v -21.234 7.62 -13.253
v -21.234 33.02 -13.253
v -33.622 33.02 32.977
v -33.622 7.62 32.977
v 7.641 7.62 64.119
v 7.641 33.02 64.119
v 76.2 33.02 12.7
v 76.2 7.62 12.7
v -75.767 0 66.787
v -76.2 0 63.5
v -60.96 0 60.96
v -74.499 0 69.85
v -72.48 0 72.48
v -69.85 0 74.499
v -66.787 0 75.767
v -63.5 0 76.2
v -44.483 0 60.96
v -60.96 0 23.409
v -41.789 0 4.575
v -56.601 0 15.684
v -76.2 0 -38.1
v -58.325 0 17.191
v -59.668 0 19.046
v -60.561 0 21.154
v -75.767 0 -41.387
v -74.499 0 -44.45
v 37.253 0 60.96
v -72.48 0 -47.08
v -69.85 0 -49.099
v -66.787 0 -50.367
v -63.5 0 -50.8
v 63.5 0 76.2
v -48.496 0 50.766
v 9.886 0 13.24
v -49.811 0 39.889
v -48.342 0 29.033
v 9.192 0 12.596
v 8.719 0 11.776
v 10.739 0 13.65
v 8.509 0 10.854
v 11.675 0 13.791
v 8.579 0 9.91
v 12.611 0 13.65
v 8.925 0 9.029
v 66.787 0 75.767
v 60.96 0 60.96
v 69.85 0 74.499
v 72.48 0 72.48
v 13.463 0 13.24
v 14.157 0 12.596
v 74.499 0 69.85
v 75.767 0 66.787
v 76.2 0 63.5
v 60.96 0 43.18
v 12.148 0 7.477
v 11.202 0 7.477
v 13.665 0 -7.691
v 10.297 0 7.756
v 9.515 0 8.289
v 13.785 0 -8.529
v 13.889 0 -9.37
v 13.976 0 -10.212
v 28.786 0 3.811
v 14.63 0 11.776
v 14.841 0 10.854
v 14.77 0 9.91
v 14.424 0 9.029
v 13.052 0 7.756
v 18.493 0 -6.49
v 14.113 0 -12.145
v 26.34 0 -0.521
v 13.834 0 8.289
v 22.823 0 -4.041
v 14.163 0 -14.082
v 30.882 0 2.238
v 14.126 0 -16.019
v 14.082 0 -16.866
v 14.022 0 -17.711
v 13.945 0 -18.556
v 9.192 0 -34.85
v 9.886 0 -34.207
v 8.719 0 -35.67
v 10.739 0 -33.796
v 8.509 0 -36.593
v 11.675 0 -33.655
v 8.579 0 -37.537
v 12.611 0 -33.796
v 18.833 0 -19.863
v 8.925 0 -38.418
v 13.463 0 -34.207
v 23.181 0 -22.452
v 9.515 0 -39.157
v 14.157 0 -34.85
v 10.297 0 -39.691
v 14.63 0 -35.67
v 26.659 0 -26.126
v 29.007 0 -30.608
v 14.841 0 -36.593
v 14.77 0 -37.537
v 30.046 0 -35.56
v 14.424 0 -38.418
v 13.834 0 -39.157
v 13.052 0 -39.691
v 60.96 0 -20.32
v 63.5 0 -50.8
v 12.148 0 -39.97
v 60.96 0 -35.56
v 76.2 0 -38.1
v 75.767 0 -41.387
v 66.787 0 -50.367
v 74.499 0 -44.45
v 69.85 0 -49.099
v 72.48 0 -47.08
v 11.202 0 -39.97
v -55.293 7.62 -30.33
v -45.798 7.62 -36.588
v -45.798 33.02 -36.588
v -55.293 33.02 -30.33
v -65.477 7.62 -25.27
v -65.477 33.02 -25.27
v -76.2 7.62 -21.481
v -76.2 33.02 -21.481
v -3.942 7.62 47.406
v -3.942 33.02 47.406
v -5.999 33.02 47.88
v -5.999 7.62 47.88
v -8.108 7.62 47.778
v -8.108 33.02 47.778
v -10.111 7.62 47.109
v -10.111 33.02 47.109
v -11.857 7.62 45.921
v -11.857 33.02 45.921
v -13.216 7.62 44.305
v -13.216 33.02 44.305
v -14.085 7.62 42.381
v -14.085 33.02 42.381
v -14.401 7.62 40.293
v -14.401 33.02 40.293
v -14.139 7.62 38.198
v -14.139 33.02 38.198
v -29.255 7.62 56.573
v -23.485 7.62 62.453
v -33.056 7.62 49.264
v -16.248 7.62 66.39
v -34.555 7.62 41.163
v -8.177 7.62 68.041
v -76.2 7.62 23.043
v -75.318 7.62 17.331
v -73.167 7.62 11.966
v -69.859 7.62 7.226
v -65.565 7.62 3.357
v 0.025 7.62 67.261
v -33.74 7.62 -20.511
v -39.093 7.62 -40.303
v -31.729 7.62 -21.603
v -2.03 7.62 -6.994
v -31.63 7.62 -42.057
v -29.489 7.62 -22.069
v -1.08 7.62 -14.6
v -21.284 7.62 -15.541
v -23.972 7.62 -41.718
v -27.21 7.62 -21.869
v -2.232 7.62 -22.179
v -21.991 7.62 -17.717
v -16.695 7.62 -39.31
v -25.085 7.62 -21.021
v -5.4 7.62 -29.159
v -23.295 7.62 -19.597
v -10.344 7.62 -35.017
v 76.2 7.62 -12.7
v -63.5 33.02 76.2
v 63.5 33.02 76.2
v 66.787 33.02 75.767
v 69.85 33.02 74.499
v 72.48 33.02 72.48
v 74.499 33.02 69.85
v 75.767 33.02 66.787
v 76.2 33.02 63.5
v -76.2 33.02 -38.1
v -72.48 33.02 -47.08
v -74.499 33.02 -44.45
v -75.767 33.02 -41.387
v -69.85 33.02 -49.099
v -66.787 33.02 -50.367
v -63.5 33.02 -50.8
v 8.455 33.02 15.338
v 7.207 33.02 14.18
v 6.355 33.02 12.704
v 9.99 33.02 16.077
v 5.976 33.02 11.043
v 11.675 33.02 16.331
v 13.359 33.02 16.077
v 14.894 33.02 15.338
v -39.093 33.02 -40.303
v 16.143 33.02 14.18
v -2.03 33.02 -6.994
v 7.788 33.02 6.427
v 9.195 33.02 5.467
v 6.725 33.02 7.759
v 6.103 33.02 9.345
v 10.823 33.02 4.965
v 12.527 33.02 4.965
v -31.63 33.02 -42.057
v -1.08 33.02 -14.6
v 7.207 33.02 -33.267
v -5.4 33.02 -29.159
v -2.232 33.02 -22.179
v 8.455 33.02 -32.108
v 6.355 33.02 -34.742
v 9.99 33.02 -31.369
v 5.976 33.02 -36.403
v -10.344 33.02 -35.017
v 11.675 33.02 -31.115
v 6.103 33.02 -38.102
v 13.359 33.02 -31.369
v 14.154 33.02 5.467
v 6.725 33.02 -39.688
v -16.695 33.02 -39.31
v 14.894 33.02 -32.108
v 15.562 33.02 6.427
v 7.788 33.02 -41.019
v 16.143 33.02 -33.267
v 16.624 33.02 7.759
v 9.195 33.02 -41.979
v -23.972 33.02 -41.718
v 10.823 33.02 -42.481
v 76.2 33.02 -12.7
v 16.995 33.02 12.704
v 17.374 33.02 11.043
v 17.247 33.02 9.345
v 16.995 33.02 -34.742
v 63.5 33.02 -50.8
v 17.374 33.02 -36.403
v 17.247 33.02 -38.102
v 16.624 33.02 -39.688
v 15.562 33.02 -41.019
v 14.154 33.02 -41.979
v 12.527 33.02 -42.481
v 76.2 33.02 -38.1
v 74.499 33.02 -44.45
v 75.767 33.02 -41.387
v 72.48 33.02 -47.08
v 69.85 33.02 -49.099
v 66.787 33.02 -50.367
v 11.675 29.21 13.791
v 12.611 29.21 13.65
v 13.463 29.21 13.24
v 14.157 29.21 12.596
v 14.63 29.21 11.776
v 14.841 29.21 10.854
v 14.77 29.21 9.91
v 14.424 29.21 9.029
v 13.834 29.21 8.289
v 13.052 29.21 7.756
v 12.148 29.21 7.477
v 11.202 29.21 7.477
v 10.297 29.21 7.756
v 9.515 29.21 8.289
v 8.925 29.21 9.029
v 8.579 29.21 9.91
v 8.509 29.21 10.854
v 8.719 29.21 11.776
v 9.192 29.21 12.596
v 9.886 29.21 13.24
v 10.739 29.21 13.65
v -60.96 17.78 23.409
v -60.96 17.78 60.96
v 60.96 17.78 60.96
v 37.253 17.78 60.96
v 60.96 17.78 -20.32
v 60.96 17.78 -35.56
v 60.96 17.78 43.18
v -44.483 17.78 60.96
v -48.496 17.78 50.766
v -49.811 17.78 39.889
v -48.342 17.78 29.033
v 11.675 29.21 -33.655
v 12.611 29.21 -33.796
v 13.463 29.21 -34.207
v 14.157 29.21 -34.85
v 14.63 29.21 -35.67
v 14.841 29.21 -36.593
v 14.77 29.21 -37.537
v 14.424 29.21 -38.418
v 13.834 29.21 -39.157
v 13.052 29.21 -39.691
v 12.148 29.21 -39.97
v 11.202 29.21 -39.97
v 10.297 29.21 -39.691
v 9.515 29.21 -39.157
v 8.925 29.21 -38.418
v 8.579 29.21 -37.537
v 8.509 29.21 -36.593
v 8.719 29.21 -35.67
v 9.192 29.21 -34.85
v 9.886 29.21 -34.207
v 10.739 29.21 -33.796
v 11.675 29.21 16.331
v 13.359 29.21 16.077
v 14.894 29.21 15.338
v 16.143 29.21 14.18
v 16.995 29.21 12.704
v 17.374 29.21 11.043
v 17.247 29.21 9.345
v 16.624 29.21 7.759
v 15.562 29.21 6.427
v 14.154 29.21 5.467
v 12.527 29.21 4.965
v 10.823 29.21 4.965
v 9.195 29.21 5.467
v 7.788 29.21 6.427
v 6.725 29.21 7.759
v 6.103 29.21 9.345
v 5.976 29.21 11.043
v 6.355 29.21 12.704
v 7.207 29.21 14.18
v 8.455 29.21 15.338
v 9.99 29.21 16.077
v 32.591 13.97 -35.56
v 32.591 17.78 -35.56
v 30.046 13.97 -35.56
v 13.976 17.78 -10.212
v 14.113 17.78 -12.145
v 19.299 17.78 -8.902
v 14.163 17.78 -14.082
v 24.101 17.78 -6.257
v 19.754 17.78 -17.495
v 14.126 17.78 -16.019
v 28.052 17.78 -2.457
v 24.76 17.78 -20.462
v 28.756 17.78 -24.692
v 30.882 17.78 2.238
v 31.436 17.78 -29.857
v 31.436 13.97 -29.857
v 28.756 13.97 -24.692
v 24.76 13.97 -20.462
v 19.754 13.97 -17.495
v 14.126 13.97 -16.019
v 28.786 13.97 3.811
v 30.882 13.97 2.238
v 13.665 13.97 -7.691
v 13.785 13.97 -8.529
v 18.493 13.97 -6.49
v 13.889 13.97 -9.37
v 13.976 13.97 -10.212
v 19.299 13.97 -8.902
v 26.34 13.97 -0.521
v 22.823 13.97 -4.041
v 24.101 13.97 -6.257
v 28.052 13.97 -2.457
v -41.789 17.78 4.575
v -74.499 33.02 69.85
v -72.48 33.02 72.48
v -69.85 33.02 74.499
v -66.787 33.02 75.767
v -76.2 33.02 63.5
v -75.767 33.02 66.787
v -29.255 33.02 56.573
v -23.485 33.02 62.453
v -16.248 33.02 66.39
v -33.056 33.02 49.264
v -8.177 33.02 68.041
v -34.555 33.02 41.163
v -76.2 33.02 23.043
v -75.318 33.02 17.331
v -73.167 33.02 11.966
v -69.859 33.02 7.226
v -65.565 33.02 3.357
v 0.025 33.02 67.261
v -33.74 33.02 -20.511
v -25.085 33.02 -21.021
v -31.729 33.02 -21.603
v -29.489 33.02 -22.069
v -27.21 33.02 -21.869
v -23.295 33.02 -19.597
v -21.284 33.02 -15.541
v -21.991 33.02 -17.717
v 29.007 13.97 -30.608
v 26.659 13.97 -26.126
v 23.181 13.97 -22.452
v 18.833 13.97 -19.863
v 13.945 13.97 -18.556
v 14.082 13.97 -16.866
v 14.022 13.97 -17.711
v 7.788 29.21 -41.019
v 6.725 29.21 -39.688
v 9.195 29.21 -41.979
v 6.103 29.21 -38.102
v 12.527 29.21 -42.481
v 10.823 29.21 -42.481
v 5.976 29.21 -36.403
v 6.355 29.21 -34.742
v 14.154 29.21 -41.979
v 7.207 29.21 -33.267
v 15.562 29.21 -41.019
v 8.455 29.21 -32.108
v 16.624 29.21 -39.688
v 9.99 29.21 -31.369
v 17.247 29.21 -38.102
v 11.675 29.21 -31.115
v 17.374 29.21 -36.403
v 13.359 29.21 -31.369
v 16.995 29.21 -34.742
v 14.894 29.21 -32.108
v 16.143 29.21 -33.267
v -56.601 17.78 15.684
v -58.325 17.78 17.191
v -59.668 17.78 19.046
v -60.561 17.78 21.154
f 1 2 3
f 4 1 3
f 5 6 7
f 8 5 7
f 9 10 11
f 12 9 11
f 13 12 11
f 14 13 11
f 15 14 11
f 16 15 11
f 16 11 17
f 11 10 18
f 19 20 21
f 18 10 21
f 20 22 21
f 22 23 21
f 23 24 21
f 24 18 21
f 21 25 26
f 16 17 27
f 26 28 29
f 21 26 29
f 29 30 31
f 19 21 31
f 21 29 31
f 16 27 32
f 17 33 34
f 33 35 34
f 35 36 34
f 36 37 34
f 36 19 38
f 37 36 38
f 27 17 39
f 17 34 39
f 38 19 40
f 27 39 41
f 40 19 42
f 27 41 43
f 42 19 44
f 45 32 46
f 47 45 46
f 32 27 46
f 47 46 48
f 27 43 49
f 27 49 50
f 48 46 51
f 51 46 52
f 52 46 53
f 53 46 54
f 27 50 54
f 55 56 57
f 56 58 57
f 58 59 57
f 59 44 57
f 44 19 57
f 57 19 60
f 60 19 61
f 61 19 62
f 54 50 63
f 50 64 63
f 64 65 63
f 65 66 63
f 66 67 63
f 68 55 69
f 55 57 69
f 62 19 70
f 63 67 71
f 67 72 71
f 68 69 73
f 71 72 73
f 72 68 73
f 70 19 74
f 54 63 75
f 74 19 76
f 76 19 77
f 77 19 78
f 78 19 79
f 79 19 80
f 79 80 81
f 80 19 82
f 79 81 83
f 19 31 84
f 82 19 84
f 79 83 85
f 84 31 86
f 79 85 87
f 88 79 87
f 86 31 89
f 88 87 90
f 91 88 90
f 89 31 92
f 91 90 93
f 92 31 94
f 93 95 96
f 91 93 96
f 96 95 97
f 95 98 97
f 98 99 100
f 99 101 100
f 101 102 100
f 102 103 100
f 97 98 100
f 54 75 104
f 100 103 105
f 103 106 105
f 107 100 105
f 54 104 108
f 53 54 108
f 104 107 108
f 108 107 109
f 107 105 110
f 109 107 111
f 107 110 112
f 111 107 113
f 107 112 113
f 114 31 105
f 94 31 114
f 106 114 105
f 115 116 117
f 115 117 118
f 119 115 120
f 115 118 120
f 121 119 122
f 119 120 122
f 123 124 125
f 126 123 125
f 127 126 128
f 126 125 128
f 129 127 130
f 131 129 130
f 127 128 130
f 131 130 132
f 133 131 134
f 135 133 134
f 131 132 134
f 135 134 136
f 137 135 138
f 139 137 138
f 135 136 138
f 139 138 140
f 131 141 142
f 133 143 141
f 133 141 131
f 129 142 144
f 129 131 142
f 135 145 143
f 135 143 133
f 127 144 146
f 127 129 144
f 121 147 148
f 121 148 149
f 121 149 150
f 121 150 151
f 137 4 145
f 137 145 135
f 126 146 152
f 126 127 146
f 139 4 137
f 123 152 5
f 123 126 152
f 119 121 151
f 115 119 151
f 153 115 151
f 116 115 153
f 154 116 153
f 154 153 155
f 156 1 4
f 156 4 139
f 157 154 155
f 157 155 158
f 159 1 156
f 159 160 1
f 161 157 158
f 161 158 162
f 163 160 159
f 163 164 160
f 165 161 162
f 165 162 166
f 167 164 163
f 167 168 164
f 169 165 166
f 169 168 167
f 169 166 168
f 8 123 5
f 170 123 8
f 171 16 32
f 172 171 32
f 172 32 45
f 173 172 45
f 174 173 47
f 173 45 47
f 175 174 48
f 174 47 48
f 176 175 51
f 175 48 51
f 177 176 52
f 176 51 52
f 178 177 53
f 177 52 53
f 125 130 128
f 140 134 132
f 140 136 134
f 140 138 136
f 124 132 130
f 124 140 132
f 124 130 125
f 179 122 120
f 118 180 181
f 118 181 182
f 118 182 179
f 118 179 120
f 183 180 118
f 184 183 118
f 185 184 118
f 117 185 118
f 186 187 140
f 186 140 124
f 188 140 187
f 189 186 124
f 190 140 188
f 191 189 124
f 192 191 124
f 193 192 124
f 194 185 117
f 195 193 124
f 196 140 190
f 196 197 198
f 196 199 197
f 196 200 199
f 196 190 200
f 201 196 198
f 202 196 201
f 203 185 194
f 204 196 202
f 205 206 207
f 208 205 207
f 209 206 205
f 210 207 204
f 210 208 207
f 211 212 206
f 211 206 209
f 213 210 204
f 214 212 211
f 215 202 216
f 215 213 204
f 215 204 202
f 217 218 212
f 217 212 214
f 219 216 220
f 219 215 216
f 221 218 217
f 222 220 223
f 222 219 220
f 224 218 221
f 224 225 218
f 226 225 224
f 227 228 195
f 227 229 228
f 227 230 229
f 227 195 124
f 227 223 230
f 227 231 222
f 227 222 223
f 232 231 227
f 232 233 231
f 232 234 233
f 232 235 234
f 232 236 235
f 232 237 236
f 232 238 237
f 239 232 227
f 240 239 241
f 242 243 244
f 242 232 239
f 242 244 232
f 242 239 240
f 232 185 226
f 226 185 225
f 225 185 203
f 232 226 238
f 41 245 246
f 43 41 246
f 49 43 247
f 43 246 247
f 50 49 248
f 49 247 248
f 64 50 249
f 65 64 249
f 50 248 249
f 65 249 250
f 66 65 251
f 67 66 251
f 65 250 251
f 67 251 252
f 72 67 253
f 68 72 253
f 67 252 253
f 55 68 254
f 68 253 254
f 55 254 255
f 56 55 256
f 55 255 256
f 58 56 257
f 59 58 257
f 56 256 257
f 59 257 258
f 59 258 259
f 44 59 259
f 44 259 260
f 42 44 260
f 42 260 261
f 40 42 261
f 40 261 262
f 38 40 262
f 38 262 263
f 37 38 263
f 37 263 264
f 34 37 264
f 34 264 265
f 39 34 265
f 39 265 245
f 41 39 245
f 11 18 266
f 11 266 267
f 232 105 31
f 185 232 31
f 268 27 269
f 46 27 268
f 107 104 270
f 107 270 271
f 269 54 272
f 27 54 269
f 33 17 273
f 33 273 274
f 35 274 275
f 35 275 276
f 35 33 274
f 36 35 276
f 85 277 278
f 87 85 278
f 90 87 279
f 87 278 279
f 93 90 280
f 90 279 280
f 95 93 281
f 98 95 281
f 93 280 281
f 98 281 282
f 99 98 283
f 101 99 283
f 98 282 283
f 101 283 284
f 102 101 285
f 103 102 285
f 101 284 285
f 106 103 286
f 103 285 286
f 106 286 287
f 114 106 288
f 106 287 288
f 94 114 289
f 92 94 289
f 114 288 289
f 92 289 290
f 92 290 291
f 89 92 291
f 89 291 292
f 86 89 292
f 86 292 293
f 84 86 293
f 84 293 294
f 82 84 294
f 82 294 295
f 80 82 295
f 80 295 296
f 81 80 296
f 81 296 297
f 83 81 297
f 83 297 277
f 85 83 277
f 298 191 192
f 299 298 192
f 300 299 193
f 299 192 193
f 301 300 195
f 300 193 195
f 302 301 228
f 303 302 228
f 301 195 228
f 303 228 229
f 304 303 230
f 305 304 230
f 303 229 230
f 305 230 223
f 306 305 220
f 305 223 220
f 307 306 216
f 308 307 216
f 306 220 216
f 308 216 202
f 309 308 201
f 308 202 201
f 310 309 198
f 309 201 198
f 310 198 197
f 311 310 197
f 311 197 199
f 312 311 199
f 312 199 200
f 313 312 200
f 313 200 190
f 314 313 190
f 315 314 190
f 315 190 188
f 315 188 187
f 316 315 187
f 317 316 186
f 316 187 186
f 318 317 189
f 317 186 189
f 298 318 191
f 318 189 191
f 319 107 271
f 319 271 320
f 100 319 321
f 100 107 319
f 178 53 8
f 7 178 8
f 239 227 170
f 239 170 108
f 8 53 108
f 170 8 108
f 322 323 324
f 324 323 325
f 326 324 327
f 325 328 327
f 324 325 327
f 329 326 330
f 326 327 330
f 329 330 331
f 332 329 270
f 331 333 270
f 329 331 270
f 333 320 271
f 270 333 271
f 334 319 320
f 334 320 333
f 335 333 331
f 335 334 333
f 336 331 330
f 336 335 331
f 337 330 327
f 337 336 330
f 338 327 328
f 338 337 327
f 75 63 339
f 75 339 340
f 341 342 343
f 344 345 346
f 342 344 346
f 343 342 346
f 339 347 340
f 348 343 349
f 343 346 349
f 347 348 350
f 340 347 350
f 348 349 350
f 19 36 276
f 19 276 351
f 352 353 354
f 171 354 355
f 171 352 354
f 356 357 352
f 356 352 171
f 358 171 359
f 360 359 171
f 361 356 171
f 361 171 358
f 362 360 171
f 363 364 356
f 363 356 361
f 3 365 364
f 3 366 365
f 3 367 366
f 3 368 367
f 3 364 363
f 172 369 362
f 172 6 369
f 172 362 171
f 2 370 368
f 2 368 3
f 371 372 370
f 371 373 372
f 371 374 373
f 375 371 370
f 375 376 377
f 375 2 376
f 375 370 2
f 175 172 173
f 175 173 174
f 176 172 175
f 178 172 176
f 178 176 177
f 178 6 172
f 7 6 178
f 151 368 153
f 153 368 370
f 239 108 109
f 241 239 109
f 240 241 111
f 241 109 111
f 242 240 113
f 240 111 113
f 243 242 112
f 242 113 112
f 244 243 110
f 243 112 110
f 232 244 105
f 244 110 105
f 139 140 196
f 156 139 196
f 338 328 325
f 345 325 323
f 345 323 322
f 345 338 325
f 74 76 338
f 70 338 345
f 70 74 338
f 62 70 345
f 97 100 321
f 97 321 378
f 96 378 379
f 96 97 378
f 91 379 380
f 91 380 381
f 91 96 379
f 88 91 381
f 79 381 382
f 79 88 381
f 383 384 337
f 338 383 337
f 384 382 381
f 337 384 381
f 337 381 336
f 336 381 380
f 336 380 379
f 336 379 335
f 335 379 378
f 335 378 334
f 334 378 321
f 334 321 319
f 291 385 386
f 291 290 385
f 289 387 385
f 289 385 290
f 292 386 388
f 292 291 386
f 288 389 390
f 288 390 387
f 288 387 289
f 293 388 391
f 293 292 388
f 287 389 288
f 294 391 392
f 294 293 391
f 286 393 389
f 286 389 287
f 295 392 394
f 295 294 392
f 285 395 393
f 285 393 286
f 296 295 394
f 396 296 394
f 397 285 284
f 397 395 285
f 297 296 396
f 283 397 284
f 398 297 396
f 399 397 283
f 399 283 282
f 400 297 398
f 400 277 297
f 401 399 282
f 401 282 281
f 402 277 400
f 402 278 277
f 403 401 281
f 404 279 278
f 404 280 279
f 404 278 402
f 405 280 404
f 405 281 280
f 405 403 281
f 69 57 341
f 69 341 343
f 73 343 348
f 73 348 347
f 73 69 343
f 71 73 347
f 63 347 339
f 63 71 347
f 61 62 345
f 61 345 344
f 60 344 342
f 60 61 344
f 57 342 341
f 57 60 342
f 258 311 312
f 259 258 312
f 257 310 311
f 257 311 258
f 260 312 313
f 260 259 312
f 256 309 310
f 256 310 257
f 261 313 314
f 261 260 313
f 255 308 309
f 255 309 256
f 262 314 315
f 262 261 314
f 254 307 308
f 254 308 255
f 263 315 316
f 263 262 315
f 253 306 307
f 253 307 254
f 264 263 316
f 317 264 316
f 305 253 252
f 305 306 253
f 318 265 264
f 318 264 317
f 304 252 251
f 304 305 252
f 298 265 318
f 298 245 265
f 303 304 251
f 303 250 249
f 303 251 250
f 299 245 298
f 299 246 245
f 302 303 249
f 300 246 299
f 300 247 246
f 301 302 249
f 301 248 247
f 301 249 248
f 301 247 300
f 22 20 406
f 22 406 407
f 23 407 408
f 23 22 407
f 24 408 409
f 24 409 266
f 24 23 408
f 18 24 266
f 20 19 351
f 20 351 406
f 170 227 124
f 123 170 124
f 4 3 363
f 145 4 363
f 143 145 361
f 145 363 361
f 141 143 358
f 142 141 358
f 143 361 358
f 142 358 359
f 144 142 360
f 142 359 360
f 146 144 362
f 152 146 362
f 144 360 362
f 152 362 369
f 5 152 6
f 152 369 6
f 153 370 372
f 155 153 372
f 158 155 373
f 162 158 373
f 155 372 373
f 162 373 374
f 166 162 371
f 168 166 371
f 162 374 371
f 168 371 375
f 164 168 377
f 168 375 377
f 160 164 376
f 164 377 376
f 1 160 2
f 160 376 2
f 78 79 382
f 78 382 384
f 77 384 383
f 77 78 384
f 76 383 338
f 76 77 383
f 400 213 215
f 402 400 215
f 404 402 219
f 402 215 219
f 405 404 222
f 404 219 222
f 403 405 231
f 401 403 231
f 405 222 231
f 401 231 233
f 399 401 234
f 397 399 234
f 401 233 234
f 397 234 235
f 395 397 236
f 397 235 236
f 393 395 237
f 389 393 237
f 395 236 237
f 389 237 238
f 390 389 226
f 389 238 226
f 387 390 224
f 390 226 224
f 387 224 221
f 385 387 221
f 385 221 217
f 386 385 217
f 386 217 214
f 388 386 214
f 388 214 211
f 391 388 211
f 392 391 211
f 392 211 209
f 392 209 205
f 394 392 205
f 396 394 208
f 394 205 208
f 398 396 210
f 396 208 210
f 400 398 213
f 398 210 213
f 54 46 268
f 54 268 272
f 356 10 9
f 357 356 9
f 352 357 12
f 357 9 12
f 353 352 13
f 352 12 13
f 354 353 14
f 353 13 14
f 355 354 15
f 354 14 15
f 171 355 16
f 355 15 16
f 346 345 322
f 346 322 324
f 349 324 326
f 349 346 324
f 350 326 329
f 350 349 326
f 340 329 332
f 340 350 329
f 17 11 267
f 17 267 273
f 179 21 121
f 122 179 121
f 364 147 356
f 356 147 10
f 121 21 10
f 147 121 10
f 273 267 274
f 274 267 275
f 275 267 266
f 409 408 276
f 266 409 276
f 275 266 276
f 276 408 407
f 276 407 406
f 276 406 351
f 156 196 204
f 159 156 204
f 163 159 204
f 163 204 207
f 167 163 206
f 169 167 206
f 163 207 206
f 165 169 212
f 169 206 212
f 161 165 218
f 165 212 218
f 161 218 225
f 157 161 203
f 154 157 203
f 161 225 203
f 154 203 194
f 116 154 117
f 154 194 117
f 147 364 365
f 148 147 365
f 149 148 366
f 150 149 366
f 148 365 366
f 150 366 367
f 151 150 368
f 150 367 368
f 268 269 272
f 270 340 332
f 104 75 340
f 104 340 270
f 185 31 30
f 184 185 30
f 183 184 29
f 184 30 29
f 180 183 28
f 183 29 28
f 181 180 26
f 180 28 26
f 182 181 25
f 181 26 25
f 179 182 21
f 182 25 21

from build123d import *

# Parameters (mm, degrees)
BOSS_EXTRUDE1_DEPTH = 33.02
CUT_EXTRUDE1_DEPTH  = 25.4
SKETCH3_R           = 3.175
CUT_EXTRUDE2_DEPTH  = 113.70847528
SKETCH4_R           = 5.715
SKETCH4_R_2         = 3.175
CUT_EXTRUDE3_DEPTH  = 3.81
SHELL4_DEPTH        = 17.78
SHELL4_2_DEPTH      = 13.97


# Read off the part's stored shape, not the designer's step: Shell4
with BuildPart() as part:
    # Sketch1 → Boss-Extrude1 (new body)
    with BuildSketch(Plane(origin=(0, 0, 0), x_dir=(1, 0, 0), z_dir=(0, 1, 0))):
        with BuildLine():
            Line((-63.5, -76.2), (63.5, -76.2))
            ThreePointArc((63.5, -76.2), (72.480256121, -72.480256121), (76.2, -63.5))
            Line((76.2, -63.5), (76.2, 38.1))
            ThreePointArc((76.2, 38.1), (72.480256121, 47.080256121), (63.5, 50.8))
            Line((63.5, 50.8), (-63.5, 50.8))
            ThreePointArc((-63.5, 50.8), (-72.480256121, 47.080256121), (-76.2, 38.1))
            Line((-76.2, 38.1), (-76.2, -63.5))
            ThreePointArc((-76.2, -63.5), (-72.480256121, -72.480256121), (-63.5, -76.2))
        make_face()
    extrude(amount=BOSS_EXTRUDE1_DEPTH)

    # Sketch2 → Cut-Extrude1 (cut)
    with BuildSketch(Plane(origin=(0, 33.02, 0), x_dir=(1, 0, 0), z_dir=(0, 1, 0))):
        with BuildLine():
            Line((-21.234187682, 13.253251383), (-33.621595815, -32.977185142))
            ThreePointArc((-33.621595815, -32.977185142), (-23.484698626, -62.452913285), (7.640823288, -64.119382534))
            Line((7.640823288, -64.119382534), (76.2, -12.7))
            Line((76.2, -12.7), (76.2, 12.7))
            Line((76.2, 12.7), (-3.941576712, -47.406182534))
            ThreePointArc((-3.941576712, -47.406182534), (-11.856979187, -45.921156496), (-14.138642435, -38.197626766))
            Line((-14.138642435, -38.197626766), (-2.029571171, 6.994042425))
            ThreePointArc((-2.029571171, 6.994042425), (-13.371601822, 37.382259223), (-45.797751473, 36.588408962))
            ThreePointArc((-45.797751473, 36.588408962), (-60.308353779, 27.645114035), (-76.2, 21.481050133))
            Line((-76.2, 21.481050133), (-76.2, -23.043277433))
            ThreePointArc((-76.2, -23.043277433), (-73.166835121, -11.965986434), (-65.564641264, -3.357089081))
            Line((-65.564641264, -3.357089081), (-33.739992737, 20.511397314))
            ThreePointArc((-33.739992737, 20.511397314), (-25.085058678, 21.02103117), (-21.234187682, 13.253251383))
        make_face()
    extrude(amount=-CUT_EXTRUDE1_DEPTH, mode=Mode.SUBTRACT)

    # Sketch3 → Cut-Extrude2 (cut, through all)
    with BuildSketch(Plane(origin=(0, 33.02, 0), x_dir=(1, 0, 0), z_dir=(0, 1, 0))):
        with Locations(Location((11.674814186, 36.83, 0), (0, 0, 270))):
            Circle(SKETCH3_R)
        with Locations(Location((11.674814186, -10.616391667, 0), (0, 0, 270))):
            Circle(SKETCH3_R)
    extrude(amount=-CUT_EXTRUDE2_DEPTH, mode=Mode.SUBTRACT)

    # Sketch4 → Cut-Extrude3 (cut)
    # profile 1 of 2: a face of its own
    with BuildSketch(Plane(origin=(0, 33.02, 0), x_dir=(1, 0, 0), z_dir=(0, 1, 0))):
        with Locations(Location((11.674814186, 36.83, 0), (0, 0, 270))):
            Circle(SKETCH4_R)
    # profile 2 of 2: a face of its own
    with BuildSketch(Plane(origin=(0, 33.02, 0), x_dir=(1, 0, 0), z_dir=(0, 1, 0))):
        with Locations(Location((11.674814186, -10.616391667, 0), (0, 0, 270))):
            Circle(SKETCH4_R)
        with Locations(Location((11.674814186, -10.616391667, 0), (0, 0, 270))):
            Circle(SKETCH4_R_2, mode=Mode.SUBTRACT)
    extrude(amount=-CUT_EXTRUDE3_DEPTH, mode=Mode.SUBTRACT)

    # Shell4 outline → Shell4 (cut)
    with BuildSketch(Plane(origin=(0, 0, 0), x_dir=(1, 0, 0), z_dir=(0, 1, 0))):
        with BuildLine():
            Line((-41.788947679, -4.575318892), (-56.600935015, -15.684309395))
            ThreePointArc((-56.600935015, -15.684309395), (-59.668026883, -19.046046541), (-60.96, -23.409432225))
            Line((-60.96, -23.409432225), (-60.96, -60.96))
            Line((-60.96, -60.96), (-44.483340176, -60.96))
            ThreePointArc((-44.483340176, -60.96), (-49.500189899, -45.369554015), (-48.342305407, -29.032782895))
            Line((-48.342305407, -29.032782895), (-41.788947679, -4.575318892))
        make_face()
        Polygon((37.253333333, -60.96), (60.96, -60.96), (60.96, -43.18), align=None)
        with BuildLine():
            ThreePointArc((13.975676971, 10.211907722), (24.100715908, 6.256930217), (30.882136703, -2.238397473))
            Line((30.882136703, -2.238397473), (60.96, 20.32))
            Line((60.96, 20.32), (60.96, 35.56))
            Line((60.96, 35.56), (32.591293933, 35.56))
            ThreePointArc((32.591293933, 35.56), (26.905461548, 22.437661554), (14.125676613, 16.018817949))
            ThreePointArc((14.125676613, 16.018817949), (14.148411798, 13.11283822), (13.975676971, 10.211907722))
        make_face()
    extrude(amount=SHELL4_DEPTH, mode=Mode.SUBTRACT)

    # Shell4 2 outline → Shell4 2 (cut)
    with BuildSketch(Plane(origin=(0, 0, 0), x_dir=(1, 0, 0), z_dir=(0, 1, 0))):
        with BuildLine():
            Line((28.785986128, -3.810510404), (30.882136703, -2.238397473))
            ThreePointArc((30.882136703, -2.238397473), (24.100715908, 6.256930217), (13.975676971, 10.211907722))
            ThreePointArc((13.975676971, 10.211907722), (13.838972267, 8.949034749), (13.66518896, 7.690728075))
            ThreePointArc((13.66518896, 7.690728075), (22.823217362, 4.040529279), (28.785986128, -3.810510404))
        make_face()
        with BuildLine():
            ThreePointArc((13.945477939, 18.555528431), (14.054251914, 17.288499768), (14.125676613, 16.018817949))
            ThreePointArc((14.125676613, 16.018817949), (26.905461548, 22.437661554), (32.591293933, 35.56))
            Line((32.591293933, 35.56), (30.045968886, 35.56))
            ThreePointArc((30.045968886, 35.56), (25.046769189, 24.168916144), (13.945477939, 18.555528431))
        make_face()
    extrude(amount=SHELL4_2_DEPTH, mode=Mode.SUBTRACT)


solid = part.part
